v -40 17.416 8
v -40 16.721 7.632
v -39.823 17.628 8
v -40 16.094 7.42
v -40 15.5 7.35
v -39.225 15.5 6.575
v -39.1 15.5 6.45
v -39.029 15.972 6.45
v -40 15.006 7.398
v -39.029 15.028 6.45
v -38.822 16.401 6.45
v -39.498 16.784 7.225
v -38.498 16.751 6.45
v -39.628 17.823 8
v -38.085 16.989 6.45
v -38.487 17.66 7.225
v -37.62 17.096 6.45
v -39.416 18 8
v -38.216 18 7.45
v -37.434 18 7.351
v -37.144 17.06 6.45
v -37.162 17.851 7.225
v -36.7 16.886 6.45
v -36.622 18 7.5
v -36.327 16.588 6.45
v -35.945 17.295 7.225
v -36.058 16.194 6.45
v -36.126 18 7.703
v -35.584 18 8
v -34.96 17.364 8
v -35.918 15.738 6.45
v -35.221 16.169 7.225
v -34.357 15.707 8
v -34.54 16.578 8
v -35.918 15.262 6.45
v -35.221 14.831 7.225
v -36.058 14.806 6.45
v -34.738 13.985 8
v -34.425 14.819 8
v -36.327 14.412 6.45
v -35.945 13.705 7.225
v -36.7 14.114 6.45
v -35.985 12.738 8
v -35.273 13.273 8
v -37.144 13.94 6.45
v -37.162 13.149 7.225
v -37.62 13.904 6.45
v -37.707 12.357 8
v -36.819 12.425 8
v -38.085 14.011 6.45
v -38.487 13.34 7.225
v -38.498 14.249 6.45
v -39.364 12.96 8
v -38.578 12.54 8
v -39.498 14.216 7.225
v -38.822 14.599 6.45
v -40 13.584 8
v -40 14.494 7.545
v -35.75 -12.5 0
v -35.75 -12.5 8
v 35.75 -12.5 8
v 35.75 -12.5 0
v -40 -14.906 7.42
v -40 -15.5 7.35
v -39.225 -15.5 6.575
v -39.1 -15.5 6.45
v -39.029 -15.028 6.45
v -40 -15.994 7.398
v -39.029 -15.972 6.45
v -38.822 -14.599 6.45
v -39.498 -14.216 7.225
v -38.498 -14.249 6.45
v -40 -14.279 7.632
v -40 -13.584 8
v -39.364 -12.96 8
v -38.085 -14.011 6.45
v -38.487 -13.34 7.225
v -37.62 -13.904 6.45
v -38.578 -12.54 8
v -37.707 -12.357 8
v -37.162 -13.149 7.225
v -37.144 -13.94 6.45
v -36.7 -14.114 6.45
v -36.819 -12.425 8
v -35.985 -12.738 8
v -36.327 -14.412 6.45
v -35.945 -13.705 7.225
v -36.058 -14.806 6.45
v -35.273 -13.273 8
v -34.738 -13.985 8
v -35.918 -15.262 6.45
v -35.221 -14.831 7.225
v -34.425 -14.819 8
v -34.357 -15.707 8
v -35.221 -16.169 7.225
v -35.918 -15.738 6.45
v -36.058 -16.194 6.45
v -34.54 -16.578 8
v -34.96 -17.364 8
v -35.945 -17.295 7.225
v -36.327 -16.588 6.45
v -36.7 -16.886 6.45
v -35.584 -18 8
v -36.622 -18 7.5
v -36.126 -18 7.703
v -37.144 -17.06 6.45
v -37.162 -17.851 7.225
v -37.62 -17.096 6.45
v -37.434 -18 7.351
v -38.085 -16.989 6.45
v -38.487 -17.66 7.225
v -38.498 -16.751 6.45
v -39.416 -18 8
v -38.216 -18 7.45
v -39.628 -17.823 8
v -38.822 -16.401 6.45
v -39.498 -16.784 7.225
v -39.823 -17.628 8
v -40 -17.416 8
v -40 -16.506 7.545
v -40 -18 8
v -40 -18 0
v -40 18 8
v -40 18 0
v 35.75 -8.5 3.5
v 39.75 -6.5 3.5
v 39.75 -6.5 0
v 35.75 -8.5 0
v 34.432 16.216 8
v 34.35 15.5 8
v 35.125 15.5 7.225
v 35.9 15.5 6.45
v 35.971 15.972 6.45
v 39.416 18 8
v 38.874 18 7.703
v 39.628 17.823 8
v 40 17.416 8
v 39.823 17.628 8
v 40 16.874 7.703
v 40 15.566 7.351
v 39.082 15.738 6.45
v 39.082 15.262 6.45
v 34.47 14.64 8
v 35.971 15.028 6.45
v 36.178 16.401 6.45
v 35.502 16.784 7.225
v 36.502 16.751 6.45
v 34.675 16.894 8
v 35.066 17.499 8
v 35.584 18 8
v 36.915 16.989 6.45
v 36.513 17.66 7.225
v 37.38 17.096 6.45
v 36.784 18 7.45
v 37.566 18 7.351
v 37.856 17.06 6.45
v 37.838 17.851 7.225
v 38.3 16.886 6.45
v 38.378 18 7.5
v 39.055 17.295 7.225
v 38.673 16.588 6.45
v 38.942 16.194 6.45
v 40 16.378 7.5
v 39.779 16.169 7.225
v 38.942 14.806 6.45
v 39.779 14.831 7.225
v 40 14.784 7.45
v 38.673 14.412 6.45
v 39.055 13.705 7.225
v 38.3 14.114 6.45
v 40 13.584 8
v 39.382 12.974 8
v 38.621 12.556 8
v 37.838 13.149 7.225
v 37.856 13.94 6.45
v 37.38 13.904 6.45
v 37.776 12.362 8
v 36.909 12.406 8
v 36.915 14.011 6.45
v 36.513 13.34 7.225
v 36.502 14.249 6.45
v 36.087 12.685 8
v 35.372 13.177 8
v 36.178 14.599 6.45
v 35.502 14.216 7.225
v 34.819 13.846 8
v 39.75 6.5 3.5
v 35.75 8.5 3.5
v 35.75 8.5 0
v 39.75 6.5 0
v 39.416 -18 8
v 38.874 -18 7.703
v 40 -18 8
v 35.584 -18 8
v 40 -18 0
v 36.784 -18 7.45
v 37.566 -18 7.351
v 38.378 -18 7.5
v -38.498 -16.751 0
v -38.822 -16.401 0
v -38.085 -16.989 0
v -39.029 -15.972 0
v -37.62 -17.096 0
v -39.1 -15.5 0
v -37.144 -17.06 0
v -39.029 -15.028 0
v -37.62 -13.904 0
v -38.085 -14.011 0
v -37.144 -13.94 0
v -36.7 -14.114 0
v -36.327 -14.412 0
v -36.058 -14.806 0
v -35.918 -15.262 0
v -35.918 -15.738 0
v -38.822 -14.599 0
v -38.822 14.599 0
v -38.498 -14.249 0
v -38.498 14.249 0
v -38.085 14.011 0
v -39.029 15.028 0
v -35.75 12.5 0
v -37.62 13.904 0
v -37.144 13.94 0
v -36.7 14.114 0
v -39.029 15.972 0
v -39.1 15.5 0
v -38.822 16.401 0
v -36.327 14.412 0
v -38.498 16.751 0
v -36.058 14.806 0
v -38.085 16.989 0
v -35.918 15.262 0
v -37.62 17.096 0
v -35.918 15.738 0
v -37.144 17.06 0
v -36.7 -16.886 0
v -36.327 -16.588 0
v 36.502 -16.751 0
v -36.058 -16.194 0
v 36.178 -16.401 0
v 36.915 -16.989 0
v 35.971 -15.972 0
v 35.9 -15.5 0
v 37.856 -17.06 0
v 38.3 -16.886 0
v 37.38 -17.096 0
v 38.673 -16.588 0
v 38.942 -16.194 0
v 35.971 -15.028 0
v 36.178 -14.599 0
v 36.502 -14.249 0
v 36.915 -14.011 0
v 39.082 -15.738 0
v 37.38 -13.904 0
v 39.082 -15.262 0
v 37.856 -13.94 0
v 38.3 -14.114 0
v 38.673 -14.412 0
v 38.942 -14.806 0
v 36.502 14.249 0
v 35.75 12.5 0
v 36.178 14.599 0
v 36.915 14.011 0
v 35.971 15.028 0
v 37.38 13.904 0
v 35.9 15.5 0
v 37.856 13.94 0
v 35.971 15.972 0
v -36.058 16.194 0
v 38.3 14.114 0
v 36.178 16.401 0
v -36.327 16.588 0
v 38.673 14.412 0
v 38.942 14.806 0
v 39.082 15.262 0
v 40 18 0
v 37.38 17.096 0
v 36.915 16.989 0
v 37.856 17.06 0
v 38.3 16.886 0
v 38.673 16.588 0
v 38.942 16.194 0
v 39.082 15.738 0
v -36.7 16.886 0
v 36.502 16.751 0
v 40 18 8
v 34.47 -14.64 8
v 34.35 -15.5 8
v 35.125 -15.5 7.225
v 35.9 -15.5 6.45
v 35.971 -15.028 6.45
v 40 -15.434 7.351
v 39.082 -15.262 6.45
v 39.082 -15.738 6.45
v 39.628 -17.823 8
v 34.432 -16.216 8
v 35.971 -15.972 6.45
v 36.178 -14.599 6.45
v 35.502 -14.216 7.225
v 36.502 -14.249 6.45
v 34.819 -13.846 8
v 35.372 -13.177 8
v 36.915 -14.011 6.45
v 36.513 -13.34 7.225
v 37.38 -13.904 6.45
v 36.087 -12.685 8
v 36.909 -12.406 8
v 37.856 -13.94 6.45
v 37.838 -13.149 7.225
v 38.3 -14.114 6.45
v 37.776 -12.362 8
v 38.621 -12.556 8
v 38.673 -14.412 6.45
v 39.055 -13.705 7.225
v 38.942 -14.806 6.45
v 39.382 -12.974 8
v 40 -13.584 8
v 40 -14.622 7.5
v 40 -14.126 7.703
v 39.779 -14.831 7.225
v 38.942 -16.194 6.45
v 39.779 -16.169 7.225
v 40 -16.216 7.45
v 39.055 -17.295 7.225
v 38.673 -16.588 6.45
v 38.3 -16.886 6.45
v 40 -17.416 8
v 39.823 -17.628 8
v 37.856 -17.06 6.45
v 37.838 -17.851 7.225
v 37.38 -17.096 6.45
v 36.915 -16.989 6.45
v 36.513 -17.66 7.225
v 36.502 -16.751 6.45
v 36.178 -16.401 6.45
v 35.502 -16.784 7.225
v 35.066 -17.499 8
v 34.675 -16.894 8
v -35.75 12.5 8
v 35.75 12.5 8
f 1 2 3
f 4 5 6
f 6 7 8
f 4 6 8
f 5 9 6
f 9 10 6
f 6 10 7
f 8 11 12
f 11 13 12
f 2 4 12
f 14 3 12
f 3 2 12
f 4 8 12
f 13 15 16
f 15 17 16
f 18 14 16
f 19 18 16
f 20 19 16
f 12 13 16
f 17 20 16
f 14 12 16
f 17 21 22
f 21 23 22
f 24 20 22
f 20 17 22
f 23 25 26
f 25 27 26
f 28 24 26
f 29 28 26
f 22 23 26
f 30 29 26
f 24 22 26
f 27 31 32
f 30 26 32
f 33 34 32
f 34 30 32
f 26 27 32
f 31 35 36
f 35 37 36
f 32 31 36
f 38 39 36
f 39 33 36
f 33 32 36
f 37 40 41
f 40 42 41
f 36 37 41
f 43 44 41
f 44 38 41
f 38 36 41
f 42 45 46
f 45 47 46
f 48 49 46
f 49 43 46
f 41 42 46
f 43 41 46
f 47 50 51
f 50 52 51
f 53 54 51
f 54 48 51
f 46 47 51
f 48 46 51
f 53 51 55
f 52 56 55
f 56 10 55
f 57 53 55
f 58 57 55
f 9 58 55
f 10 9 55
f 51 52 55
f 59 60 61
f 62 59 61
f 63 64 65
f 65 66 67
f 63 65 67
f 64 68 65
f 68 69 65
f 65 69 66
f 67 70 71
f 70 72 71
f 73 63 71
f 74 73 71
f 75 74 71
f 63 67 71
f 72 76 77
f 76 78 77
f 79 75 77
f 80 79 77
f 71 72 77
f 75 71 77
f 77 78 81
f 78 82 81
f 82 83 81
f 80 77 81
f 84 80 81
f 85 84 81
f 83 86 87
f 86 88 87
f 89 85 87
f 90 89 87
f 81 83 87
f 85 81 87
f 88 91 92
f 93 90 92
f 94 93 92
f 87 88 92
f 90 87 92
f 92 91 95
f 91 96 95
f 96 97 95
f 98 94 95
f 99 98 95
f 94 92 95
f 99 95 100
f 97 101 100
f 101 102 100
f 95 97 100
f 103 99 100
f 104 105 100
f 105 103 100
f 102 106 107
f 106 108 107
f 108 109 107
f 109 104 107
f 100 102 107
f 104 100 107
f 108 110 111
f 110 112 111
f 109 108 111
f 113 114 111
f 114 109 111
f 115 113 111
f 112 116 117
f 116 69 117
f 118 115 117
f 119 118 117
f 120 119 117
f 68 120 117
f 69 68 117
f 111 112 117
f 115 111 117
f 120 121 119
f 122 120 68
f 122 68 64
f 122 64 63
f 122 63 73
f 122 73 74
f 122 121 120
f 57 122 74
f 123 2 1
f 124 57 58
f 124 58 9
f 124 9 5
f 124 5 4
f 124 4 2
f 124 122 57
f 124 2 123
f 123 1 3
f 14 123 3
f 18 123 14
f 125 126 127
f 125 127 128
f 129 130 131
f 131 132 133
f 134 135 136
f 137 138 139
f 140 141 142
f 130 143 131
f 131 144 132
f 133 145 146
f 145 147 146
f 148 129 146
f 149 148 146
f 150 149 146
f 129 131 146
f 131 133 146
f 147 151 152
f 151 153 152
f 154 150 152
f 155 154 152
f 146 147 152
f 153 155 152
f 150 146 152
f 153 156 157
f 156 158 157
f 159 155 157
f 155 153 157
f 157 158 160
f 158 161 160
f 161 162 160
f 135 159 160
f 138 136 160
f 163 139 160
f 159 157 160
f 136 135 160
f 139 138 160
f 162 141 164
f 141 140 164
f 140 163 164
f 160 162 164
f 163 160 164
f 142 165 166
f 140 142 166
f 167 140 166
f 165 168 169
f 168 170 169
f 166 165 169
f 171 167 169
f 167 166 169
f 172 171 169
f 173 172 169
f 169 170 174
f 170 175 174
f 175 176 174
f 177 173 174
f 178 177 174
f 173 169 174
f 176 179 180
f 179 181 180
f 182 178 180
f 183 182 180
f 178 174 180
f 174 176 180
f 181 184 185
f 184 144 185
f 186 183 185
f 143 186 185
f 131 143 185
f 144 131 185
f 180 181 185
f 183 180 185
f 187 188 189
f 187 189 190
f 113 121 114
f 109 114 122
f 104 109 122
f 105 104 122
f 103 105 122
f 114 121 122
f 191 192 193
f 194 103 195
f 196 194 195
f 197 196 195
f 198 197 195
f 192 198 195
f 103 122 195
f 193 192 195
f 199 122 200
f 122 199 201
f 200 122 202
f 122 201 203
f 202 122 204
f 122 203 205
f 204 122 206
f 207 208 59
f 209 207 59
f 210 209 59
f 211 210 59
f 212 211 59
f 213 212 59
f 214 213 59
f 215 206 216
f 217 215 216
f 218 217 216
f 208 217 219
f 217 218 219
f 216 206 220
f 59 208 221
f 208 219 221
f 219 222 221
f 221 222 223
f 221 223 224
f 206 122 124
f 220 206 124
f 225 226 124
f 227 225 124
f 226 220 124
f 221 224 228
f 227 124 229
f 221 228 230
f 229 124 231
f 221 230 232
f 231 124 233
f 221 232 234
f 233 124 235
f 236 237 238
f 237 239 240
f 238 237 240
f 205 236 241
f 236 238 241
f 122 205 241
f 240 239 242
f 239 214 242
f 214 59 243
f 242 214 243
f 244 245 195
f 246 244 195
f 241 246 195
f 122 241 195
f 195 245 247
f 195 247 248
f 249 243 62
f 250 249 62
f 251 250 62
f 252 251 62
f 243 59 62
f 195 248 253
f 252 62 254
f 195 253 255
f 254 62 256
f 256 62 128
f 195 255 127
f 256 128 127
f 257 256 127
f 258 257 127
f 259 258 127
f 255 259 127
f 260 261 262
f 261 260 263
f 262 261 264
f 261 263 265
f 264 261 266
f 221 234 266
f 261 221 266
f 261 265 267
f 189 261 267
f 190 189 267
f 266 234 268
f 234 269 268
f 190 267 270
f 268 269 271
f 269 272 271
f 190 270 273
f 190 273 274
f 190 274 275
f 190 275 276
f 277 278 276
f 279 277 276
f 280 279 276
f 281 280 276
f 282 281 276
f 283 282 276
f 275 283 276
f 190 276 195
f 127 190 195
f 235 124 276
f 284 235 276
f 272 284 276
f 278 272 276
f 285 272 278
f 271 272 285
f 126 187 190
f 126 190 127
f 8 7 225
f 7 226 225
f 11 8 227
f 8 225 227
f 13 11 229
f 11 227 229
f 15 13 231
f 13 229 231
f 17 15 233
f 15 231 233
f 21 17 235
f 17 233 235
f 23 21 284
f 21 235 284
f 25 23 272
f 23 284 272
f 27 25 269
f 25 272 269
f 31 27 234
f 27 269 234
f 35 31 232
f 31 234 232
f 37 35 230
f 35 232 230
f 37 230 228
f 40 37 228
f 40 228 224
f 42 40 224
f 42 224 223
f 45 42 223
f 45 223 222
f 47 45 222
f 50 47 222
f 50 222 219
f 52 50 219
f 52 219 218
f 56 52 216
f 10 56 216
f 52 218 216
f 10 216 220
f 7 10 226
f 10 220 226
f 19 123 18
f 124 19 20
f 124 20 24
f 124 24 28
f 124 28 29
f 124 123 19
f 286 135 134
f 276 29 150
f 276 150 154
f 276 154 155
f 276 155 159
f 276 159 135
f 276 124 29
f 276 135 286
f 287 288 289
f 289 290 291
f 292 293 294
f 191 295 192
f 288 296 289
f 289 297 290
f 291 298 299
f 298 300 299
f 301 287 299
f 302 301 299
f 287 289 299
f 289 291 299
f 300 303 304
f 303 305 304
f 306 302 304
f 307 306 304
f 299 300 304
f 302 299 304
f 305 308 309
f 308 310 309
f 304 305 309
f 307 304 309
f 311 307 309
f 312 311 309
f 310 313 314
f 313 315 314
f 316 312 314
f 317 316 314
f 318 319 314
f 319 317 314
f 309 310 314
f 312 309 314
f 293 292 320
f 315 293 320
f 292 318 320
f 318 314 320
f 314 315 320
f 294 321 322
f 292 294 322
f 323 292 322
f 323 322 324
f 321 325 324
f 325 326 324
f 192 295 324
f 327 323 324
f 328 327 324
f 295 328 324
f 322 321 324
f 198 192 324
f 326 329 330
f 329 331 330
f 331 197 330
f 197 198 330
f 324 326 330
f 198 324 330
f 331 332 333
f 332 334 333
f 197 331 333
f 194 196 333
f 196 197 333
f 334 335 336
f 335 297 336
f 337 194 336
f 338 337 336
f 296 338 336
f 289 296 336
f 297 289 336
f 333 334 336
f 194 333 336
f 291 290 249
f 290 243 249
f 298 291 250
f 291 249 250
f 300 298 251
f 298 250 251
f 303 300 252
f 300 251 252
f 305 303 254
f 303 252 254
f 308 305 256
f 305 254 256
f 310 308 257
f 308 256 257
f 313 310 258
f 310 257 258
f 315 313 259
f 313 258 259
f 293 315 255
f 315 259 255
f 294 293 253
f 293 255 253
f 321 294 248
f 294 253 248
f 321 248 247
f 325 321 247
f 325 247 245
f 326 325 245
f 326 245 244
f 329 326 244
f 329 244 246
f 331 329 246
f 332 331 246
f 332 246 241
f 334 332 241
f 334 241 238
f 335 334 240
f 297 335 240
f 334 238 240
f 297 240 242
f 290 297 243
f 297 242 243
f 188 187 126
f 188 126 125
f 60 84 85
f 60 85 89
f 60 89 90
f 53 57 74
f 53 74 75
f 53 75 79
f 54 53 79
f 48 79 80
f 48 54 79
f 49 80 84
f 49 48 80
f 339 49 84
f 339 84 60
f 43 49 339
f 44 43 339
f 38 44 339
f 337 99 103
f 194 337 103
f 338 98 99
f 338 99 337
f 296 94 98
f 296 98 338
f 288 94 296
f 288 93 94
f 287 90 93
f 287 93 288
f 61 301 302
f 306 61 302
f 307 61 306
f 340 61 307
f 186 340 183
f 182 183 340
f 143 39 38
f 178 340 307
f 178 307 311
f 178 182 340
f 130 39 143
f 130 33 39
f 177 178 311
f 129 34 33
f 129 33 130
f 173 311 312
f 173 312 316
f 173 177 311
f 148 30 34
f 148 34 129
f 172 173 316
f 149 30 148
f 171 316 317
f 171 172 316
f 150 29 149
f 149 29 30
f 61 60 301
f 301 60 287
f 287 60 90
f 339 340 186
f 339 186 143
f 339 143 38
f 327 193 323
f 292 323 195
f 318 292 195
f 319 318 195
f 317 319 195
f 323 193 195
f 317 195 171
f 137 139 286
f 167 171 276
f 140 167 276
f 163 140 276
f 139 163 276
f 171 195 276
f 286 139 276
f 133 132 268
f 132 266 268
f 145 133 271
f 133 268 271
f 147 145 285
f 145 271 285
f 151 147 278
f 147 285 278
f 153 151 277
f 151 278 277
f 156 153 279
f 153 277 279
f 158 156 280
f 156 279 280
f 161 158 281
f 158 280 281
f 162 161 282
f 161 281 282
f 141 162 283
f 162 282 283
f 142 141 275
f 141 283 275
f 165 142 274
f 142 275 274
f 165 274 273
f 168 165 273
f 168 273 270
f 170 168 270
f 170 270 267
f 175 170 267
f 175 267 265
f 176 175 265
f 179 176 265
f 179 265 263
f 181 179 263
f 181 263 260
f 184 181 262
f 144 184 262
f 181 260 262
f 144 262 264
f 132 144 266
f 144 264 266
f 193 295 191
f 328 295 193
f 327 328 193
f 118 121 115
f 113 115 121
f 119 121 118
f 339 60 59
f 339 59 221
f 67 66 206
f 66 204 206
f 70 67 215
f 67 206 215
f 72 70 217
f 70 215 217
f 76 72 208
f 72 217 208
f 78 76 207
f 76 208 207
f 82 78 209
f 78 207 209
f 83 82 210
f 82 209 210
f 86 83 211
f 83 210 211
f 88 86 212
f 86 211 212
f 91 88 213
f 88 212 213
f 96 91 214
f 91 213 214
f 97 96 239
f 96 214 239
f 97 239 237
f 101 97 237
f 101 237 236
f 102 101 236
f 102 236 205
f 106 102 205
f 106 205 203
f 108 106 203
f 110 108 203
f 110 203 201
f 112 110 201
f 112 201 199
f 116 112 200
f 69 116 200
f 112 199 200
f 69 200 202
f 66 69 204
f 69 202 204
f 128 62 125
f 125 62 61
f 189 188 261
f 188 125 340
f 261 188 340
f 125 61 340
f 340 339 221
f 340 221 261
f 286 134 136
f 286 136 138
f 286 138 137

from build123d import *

# Parameters (mm, degrees)
SKETCH2_W                                       = 80
SKETCH2_H                                       = 36
BOSS_EXTRUDE2_DEPTH                             = 8
SKETCH3_W                                       = 71.5
SKETCH3_H                                       = 25
CUT_EXTRUDE1_DEPTH                              = 8
CSK_FOR_M3_FLAT_HEAD_MACHINE_SCREW1_D           = 3.2
CSK_FOR_M3_FLAT_HEAD_MACHINE_SCREW1_CSINK_D     = 6.3
CSK_FOR_M3_FLAT_HEAD_MACHINE_SCREW1_CSINK_ANGLE = 90
CUT_EXTRUDE2_DEPTH                              = 45.586993619
CUT_EXTRUDE2_DEPTH_BACK                         = 3.5


with BuildPart() as part:
    # Sketch2 → Boss-Extrude2 (new body)
    with BuildSketch(Plane.XY):
        Rectangle(SKETCH2_W, SKETCH2_H)
    extrude(amount=BOSS_EXTRUDE2_DEPTH)

    # Sketch3 → Cut-Extrude1 (cut)
    with BuildSketch(Plane.XY.offset(8)):
        Rectangle(SKETCH3_W, SKETCH3_H)
    extrude(amount=-CUT_EXTRUDE1_DEPTH, mode=Mode.SUBTRACT)

    # CSK for M3 Flat Head Machine Screw1 (through all)
    with Locations(Plane.XY.offset(8)):
        with Locations((-37.5, 15.5), (-37.5, -15.5), (37.5, 15.5), (37.5, -15.5)):
            CounterSinkHole(CSK_FOR_M3_FLAT_HEAD_MACHINE_SCREW1_D / 2, CSK_FOR_M3_FLAT_HEAD_MACHINE_SCREW1_CSINK_D / 2, counter_sink_angle=CSK_FOR_M3_FLAT_HEAD_MACHINE_SCREW1_CSINK_ANGLE)

    # Sketch7 → Cut-Extrude2 (cut, two sides: drawn at the far end of the back side and taken through both)
    with BuildSketch(Plane(origin=(0, 0, 0), x_dir=(-1, 0, 0), z_dir=(0, 0, -1)).offset(-CUT_EXTRUDE2_DEPTH_BACK)):
        Polygon((-35.75, -8.5), (-35.75, 8.5), (-39.75, 6.5), (-39.75, -6.5), align=None)
    extrude(amount=CUT_EXTRUDE2_DEPTH + CUT_EXTRUDE2_DEPTH_BACK, mode=Mode.SUBTRACT)


solid = part.part
